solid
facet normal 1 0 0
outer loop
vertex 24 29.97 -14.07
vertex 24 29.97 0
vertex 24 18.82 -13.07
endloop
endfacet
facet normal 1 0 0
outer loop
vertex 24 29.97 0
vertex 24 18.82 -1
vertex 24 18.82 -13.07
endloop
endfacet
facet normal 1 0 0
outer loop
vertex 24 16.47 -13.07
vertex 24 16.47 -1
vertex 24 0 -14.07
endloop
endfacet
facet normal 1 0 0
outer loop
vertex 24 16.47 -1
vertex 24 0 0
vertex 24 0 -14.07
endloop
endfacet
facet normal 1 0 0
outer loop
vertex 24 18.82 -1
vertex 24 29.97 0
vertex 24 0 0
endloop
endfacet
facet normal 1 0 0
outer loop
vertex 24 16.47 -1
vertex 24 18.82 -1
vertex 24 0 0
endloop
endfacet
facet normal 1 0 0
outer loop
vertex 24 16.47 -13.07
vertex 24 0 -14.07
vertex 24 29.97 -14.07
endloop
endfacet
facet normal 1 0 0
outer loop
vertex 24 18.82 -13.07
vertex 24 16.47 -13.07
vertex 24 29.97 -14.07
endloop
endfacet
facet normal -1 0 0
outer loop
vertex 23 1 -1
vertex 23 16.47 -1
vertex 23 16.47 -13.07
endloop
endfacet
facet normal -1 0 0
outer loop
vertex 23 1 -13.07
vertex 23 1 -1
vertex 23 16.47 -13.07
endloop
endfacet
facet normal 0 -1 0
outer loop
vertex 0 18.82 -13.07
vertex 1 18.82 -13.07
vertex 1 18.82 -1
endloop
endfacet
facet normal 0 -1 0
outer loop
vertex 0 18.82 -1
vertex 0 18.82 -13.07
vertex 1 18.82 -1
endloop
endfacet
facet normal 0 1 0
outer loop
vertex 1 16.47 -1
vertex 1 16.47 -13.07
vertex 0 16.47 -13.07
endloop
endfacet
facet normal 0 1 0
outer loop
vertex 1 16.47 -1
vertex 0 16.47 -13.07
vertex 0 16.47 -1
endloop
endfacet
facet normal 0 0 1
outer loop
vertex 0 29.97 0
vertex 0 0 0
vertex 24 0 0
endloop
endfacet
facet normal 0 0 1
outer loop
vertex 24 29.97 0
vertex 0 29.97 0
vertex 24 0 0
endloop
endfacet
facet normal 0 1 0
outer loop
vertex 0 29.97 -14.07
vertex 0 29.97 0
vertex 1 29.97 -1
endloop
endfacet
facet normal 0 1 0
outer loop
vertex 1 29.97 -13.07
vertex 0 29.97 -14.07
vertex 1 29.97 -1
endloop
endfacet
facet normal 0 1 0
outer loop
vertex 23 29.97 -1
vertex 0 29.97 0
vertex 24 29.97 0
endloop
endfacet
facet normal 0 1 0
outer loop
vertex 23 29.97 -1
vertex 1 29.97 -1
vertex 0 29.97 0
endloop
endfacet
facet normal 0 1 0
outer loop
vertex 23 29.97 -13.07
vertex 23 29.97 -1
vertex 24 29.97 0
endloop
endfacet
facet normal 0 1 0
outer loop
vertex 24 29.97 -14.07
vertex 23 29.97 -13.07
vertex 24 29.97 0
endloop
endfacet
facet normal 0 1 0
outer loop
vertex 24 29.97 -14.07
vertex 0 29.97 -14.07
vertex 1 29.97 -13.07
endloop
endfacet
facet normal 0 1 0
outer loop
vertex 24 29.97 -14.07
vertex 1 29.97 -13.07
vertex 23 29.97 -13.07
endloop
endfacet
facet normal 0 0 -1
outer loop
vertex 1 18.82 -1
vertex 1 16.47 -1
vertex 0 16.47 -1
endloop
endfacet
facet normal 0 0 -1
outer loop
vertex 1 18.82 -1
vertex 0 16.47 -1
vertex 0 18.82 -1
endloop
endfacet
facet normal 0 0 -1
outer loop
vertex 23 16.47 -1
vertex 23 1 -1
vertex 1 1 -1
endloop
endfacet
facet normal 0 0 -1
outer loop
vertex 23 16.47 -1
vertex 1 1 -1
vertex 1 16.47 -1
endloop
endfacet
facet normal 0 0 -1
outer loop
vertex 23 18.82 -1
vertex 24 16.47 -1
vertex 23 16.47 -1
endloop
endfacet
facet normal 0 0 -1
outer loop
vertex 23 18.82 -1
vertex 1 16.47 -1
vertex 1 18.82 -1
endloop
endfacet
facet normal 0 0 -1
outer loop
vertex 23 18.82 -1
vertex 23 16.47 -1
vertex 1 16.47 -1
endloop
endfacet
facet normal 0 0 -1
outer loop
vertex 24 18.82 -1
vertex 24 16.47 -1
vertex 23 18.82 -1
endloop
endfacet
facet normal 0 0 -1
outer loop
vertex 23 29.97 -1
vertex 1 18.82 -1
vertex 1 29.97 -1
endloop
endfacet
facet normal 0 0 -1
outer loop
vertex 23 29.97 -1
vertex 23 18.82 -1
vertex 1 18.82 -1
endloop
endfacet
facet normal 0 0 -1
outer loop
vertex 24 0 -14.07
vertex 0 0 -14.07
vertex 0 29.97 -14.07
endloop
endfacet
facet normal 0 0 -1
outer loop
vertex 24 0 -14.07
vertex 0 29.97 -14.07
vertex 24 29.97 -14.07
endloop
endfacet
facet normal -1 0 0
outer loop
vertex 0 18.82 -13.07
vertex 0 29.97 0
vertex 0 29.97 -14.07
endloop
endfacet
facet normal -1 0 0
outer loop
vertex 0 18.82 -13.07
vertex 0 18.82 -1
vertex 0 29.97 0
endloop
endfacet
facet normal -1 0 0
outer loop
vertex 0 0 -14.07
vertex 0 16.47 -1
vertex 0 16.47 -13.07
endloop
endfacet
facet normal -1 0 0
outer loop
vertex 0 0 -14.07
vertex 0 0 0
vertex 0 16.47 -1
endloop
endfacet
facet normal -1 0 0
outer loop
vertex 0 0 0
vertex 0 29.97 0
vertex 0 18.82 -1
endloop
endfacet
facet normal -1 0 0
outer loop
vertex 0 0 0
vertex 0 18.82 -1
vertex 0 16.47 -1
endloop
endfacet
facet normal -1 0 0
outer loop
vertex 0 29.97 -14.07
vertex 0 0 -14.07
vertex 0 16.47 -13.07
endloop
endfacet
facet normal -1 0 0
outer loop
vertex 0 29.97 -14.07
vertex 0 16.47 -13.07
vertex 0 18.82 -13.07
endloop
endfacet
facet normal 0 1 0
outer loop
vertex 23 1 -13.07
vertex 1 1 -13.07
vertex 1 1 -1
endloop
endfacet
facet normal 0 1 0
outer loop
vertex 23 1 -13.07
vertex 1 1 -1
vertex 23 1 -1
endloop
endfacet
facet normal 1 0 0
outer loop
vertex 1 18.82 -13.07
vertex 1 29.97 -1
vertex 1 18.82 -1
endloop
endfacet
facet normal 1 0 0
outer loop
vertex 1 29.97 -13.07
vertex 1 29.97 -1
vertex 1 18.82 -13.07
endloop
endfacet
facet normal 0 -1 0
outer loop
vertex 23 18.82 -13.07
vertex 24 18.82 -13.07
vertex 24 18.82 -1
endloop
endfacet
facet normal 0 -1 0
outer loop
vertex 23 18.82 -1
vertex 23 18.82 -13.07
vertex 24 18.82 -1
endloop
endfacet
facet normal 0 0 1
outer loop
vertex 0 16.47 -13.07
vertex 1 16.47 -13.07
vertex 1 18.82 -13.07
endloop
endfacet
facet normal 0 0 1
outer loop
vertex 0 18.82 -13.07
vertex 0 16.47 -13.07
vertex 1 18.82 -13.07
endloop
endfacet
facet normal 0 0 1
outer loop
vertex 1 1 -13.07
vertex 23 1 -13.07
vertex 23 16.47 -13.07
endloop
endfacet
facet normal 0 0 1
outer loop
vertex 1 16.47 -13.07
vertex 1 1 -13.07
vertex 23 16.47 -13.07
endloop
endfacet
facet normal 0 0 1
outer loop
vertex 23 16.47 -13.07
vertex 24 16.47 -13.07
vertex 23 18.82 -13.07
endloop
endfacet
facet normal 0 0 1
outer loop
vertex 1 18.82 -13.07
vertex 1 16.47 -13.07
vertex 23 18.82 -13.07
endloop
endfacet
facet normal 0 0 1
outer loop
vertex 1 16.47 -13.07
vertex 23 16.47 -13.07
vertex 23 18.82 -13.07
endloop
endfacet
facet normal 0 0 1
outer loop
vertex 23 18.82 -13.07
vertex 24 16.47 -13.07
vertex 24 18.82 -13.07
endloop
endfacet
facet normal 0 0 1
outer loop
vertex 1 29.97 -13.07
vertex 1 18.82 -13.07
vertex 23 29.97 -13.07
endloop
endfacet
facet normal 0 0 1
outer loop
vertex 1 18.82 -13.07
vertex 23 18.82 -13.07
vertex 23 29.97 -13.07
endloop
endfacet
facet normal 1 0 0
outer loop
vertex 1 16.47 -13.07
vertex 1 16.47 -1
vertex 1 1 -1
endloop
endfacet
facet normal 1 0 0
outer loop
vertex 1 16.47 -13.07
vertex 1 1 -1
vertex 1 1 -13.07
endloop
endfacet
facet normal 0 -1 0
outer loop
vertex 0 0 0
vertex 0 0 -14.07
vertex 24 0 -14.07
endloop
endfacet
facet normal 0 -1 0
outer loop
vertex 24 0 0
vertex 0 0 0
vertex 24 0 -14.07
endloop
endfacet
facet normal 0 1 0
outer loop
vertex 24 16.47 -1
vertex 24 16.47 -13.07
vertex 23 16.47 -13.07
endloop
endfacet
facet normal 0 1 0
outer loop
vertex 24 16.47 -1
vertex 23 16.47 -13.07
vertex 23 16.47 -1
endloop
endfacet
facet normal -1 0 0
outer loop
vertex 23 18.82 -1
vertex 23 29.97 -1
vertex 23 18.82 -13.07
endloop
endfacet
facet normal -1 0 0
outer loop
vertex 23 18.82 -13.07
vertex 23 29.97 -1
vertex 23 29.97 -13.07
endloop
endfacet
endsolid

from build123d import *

# Parameters (mm, degrees)
SKETCH1_W               = 24
SKETCH1_H               = 14.07
BOSS_EXTRUDE1_DEPTH     = 29.97
SKETCH2_W               = 22
SKETCH2_H               = 12.07
CUT_EXTRUDE1_DEPTH      = 28.97
CUT_EXTRUDE2_DEPTH      = 41.892123936
CUT_EXTRUDE2_DEPTH_BACK = 41.892123936
SKETCH3_W               = 12.07
SKETCH3_H               = 2.35


with BuildPart() as part:
    # Sketch1 → Boss-Extrude1 (new body)
    with BuildSketch(Plane(origin=(0, 0, 0), x_dir=(1, 0, 0), z_dir=(0, 1, 0))):
        with Locations((12, 7.035)):
            Rectangle(SKETCH1_W, SKETCH1_H)
    extrude(amount=BOSS_EXTRUDE1_DEPTH)

    # Sketch2 → Cut-Extrude1 (cut)
    with BuildSketch(Plane(origin=(0, 29.97, 0), x_dir=(1, 0, 0), z_dir=(0, 1, 0))):
        with Locations((12, 7.035)):
            Rectangle(SKETCH2_W, SKETCH2_H)
    extrude(amount=-CUT_EXTRUDE1_DEPTH, mode=Mode.SUBTRACT)

    # Sketch3 → Cut-Extrude2 (cut, two sides: drawn at the far end of the back side and taken through both)
    with BuildSketch(Plane.ZY.offset(-CUT_EXTRUDE2_DEPTH_BACK)):
        with Locations((-7.035, 17.645)):
            Rectangle(SKETCH3_W, SKETCH3_H)
    extrude(amount=CUT_EXTRUDE2_DEPTH + CUT_EXTRUDE2_DEPTH_BACK, mode=Mode.SUBTRACT)


solid = part.part
